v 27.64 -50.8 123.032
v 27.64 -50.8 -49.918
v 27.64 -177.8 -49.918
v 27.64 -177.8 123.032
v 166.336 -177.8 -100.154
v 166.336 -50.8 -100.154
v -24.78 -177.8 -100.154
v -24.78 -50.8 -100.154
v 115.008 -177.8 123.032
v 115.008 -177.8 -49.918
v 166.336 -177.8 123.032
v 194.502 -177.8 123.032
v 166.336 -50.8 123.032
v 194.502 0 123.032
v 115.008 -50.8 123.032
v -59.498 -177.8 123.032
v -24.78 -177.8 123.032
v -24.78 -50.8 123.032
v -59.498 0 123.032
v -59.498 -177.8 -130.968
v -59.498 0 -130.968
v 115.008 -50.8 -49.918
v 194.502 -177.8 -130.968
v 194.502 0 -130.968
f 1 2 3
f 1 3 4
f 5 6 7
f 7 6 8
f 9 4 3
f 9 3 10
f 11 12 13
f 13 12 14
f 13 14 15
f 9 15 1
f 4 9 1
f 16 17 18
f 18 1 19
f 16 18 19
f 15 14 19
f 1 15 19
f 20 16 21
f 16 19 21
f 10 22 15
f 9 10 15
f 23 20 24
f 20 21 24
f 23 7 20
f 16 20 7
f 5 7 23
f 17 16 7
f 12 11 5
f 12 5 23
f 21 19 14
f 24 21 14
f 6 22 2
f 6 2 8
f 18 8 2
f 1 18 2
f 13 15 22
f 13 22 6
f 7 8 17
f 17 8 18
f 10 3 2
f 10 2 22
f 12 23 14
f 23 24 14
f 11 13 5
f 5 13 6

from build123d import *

# Parameters (mm, degrees)
F0_W     = 254
F0_H     = 254
F1_DEPTH = 50.8
F2_W     = 87.367308
F2_H     = 172.949922
F3_DEPTH = 127


with BuildPart() as f1:
    # F0 (on Front) → F1 (new body)
    with BuildSketch(Plane.XZ):
        with Locations((67.501718, -3.968271)):
            Rectangle(F0_W, F0_H)
    extrude(amount=F1_DEPTH)

    # F2 (on face) → F3 (join)
    with BuildSketch(Plane.XZ.offset(50.8)):
        with Locations((71.324045, 36.556768)):
            Rectangle(F2_W, F2_H)
        Polygon((-24.779992, -100.1544), (-24.779992, 123.031729), (-59.498282, 123.031729), (-59.498282, -130.968271), (194.501718, -130.968271), (194.501718, 123.031729), (166.336, 123.031729), (166.336, -100.1544), align=None)
    extrude(amount=F3_DEPTH)


solid = f1.part
